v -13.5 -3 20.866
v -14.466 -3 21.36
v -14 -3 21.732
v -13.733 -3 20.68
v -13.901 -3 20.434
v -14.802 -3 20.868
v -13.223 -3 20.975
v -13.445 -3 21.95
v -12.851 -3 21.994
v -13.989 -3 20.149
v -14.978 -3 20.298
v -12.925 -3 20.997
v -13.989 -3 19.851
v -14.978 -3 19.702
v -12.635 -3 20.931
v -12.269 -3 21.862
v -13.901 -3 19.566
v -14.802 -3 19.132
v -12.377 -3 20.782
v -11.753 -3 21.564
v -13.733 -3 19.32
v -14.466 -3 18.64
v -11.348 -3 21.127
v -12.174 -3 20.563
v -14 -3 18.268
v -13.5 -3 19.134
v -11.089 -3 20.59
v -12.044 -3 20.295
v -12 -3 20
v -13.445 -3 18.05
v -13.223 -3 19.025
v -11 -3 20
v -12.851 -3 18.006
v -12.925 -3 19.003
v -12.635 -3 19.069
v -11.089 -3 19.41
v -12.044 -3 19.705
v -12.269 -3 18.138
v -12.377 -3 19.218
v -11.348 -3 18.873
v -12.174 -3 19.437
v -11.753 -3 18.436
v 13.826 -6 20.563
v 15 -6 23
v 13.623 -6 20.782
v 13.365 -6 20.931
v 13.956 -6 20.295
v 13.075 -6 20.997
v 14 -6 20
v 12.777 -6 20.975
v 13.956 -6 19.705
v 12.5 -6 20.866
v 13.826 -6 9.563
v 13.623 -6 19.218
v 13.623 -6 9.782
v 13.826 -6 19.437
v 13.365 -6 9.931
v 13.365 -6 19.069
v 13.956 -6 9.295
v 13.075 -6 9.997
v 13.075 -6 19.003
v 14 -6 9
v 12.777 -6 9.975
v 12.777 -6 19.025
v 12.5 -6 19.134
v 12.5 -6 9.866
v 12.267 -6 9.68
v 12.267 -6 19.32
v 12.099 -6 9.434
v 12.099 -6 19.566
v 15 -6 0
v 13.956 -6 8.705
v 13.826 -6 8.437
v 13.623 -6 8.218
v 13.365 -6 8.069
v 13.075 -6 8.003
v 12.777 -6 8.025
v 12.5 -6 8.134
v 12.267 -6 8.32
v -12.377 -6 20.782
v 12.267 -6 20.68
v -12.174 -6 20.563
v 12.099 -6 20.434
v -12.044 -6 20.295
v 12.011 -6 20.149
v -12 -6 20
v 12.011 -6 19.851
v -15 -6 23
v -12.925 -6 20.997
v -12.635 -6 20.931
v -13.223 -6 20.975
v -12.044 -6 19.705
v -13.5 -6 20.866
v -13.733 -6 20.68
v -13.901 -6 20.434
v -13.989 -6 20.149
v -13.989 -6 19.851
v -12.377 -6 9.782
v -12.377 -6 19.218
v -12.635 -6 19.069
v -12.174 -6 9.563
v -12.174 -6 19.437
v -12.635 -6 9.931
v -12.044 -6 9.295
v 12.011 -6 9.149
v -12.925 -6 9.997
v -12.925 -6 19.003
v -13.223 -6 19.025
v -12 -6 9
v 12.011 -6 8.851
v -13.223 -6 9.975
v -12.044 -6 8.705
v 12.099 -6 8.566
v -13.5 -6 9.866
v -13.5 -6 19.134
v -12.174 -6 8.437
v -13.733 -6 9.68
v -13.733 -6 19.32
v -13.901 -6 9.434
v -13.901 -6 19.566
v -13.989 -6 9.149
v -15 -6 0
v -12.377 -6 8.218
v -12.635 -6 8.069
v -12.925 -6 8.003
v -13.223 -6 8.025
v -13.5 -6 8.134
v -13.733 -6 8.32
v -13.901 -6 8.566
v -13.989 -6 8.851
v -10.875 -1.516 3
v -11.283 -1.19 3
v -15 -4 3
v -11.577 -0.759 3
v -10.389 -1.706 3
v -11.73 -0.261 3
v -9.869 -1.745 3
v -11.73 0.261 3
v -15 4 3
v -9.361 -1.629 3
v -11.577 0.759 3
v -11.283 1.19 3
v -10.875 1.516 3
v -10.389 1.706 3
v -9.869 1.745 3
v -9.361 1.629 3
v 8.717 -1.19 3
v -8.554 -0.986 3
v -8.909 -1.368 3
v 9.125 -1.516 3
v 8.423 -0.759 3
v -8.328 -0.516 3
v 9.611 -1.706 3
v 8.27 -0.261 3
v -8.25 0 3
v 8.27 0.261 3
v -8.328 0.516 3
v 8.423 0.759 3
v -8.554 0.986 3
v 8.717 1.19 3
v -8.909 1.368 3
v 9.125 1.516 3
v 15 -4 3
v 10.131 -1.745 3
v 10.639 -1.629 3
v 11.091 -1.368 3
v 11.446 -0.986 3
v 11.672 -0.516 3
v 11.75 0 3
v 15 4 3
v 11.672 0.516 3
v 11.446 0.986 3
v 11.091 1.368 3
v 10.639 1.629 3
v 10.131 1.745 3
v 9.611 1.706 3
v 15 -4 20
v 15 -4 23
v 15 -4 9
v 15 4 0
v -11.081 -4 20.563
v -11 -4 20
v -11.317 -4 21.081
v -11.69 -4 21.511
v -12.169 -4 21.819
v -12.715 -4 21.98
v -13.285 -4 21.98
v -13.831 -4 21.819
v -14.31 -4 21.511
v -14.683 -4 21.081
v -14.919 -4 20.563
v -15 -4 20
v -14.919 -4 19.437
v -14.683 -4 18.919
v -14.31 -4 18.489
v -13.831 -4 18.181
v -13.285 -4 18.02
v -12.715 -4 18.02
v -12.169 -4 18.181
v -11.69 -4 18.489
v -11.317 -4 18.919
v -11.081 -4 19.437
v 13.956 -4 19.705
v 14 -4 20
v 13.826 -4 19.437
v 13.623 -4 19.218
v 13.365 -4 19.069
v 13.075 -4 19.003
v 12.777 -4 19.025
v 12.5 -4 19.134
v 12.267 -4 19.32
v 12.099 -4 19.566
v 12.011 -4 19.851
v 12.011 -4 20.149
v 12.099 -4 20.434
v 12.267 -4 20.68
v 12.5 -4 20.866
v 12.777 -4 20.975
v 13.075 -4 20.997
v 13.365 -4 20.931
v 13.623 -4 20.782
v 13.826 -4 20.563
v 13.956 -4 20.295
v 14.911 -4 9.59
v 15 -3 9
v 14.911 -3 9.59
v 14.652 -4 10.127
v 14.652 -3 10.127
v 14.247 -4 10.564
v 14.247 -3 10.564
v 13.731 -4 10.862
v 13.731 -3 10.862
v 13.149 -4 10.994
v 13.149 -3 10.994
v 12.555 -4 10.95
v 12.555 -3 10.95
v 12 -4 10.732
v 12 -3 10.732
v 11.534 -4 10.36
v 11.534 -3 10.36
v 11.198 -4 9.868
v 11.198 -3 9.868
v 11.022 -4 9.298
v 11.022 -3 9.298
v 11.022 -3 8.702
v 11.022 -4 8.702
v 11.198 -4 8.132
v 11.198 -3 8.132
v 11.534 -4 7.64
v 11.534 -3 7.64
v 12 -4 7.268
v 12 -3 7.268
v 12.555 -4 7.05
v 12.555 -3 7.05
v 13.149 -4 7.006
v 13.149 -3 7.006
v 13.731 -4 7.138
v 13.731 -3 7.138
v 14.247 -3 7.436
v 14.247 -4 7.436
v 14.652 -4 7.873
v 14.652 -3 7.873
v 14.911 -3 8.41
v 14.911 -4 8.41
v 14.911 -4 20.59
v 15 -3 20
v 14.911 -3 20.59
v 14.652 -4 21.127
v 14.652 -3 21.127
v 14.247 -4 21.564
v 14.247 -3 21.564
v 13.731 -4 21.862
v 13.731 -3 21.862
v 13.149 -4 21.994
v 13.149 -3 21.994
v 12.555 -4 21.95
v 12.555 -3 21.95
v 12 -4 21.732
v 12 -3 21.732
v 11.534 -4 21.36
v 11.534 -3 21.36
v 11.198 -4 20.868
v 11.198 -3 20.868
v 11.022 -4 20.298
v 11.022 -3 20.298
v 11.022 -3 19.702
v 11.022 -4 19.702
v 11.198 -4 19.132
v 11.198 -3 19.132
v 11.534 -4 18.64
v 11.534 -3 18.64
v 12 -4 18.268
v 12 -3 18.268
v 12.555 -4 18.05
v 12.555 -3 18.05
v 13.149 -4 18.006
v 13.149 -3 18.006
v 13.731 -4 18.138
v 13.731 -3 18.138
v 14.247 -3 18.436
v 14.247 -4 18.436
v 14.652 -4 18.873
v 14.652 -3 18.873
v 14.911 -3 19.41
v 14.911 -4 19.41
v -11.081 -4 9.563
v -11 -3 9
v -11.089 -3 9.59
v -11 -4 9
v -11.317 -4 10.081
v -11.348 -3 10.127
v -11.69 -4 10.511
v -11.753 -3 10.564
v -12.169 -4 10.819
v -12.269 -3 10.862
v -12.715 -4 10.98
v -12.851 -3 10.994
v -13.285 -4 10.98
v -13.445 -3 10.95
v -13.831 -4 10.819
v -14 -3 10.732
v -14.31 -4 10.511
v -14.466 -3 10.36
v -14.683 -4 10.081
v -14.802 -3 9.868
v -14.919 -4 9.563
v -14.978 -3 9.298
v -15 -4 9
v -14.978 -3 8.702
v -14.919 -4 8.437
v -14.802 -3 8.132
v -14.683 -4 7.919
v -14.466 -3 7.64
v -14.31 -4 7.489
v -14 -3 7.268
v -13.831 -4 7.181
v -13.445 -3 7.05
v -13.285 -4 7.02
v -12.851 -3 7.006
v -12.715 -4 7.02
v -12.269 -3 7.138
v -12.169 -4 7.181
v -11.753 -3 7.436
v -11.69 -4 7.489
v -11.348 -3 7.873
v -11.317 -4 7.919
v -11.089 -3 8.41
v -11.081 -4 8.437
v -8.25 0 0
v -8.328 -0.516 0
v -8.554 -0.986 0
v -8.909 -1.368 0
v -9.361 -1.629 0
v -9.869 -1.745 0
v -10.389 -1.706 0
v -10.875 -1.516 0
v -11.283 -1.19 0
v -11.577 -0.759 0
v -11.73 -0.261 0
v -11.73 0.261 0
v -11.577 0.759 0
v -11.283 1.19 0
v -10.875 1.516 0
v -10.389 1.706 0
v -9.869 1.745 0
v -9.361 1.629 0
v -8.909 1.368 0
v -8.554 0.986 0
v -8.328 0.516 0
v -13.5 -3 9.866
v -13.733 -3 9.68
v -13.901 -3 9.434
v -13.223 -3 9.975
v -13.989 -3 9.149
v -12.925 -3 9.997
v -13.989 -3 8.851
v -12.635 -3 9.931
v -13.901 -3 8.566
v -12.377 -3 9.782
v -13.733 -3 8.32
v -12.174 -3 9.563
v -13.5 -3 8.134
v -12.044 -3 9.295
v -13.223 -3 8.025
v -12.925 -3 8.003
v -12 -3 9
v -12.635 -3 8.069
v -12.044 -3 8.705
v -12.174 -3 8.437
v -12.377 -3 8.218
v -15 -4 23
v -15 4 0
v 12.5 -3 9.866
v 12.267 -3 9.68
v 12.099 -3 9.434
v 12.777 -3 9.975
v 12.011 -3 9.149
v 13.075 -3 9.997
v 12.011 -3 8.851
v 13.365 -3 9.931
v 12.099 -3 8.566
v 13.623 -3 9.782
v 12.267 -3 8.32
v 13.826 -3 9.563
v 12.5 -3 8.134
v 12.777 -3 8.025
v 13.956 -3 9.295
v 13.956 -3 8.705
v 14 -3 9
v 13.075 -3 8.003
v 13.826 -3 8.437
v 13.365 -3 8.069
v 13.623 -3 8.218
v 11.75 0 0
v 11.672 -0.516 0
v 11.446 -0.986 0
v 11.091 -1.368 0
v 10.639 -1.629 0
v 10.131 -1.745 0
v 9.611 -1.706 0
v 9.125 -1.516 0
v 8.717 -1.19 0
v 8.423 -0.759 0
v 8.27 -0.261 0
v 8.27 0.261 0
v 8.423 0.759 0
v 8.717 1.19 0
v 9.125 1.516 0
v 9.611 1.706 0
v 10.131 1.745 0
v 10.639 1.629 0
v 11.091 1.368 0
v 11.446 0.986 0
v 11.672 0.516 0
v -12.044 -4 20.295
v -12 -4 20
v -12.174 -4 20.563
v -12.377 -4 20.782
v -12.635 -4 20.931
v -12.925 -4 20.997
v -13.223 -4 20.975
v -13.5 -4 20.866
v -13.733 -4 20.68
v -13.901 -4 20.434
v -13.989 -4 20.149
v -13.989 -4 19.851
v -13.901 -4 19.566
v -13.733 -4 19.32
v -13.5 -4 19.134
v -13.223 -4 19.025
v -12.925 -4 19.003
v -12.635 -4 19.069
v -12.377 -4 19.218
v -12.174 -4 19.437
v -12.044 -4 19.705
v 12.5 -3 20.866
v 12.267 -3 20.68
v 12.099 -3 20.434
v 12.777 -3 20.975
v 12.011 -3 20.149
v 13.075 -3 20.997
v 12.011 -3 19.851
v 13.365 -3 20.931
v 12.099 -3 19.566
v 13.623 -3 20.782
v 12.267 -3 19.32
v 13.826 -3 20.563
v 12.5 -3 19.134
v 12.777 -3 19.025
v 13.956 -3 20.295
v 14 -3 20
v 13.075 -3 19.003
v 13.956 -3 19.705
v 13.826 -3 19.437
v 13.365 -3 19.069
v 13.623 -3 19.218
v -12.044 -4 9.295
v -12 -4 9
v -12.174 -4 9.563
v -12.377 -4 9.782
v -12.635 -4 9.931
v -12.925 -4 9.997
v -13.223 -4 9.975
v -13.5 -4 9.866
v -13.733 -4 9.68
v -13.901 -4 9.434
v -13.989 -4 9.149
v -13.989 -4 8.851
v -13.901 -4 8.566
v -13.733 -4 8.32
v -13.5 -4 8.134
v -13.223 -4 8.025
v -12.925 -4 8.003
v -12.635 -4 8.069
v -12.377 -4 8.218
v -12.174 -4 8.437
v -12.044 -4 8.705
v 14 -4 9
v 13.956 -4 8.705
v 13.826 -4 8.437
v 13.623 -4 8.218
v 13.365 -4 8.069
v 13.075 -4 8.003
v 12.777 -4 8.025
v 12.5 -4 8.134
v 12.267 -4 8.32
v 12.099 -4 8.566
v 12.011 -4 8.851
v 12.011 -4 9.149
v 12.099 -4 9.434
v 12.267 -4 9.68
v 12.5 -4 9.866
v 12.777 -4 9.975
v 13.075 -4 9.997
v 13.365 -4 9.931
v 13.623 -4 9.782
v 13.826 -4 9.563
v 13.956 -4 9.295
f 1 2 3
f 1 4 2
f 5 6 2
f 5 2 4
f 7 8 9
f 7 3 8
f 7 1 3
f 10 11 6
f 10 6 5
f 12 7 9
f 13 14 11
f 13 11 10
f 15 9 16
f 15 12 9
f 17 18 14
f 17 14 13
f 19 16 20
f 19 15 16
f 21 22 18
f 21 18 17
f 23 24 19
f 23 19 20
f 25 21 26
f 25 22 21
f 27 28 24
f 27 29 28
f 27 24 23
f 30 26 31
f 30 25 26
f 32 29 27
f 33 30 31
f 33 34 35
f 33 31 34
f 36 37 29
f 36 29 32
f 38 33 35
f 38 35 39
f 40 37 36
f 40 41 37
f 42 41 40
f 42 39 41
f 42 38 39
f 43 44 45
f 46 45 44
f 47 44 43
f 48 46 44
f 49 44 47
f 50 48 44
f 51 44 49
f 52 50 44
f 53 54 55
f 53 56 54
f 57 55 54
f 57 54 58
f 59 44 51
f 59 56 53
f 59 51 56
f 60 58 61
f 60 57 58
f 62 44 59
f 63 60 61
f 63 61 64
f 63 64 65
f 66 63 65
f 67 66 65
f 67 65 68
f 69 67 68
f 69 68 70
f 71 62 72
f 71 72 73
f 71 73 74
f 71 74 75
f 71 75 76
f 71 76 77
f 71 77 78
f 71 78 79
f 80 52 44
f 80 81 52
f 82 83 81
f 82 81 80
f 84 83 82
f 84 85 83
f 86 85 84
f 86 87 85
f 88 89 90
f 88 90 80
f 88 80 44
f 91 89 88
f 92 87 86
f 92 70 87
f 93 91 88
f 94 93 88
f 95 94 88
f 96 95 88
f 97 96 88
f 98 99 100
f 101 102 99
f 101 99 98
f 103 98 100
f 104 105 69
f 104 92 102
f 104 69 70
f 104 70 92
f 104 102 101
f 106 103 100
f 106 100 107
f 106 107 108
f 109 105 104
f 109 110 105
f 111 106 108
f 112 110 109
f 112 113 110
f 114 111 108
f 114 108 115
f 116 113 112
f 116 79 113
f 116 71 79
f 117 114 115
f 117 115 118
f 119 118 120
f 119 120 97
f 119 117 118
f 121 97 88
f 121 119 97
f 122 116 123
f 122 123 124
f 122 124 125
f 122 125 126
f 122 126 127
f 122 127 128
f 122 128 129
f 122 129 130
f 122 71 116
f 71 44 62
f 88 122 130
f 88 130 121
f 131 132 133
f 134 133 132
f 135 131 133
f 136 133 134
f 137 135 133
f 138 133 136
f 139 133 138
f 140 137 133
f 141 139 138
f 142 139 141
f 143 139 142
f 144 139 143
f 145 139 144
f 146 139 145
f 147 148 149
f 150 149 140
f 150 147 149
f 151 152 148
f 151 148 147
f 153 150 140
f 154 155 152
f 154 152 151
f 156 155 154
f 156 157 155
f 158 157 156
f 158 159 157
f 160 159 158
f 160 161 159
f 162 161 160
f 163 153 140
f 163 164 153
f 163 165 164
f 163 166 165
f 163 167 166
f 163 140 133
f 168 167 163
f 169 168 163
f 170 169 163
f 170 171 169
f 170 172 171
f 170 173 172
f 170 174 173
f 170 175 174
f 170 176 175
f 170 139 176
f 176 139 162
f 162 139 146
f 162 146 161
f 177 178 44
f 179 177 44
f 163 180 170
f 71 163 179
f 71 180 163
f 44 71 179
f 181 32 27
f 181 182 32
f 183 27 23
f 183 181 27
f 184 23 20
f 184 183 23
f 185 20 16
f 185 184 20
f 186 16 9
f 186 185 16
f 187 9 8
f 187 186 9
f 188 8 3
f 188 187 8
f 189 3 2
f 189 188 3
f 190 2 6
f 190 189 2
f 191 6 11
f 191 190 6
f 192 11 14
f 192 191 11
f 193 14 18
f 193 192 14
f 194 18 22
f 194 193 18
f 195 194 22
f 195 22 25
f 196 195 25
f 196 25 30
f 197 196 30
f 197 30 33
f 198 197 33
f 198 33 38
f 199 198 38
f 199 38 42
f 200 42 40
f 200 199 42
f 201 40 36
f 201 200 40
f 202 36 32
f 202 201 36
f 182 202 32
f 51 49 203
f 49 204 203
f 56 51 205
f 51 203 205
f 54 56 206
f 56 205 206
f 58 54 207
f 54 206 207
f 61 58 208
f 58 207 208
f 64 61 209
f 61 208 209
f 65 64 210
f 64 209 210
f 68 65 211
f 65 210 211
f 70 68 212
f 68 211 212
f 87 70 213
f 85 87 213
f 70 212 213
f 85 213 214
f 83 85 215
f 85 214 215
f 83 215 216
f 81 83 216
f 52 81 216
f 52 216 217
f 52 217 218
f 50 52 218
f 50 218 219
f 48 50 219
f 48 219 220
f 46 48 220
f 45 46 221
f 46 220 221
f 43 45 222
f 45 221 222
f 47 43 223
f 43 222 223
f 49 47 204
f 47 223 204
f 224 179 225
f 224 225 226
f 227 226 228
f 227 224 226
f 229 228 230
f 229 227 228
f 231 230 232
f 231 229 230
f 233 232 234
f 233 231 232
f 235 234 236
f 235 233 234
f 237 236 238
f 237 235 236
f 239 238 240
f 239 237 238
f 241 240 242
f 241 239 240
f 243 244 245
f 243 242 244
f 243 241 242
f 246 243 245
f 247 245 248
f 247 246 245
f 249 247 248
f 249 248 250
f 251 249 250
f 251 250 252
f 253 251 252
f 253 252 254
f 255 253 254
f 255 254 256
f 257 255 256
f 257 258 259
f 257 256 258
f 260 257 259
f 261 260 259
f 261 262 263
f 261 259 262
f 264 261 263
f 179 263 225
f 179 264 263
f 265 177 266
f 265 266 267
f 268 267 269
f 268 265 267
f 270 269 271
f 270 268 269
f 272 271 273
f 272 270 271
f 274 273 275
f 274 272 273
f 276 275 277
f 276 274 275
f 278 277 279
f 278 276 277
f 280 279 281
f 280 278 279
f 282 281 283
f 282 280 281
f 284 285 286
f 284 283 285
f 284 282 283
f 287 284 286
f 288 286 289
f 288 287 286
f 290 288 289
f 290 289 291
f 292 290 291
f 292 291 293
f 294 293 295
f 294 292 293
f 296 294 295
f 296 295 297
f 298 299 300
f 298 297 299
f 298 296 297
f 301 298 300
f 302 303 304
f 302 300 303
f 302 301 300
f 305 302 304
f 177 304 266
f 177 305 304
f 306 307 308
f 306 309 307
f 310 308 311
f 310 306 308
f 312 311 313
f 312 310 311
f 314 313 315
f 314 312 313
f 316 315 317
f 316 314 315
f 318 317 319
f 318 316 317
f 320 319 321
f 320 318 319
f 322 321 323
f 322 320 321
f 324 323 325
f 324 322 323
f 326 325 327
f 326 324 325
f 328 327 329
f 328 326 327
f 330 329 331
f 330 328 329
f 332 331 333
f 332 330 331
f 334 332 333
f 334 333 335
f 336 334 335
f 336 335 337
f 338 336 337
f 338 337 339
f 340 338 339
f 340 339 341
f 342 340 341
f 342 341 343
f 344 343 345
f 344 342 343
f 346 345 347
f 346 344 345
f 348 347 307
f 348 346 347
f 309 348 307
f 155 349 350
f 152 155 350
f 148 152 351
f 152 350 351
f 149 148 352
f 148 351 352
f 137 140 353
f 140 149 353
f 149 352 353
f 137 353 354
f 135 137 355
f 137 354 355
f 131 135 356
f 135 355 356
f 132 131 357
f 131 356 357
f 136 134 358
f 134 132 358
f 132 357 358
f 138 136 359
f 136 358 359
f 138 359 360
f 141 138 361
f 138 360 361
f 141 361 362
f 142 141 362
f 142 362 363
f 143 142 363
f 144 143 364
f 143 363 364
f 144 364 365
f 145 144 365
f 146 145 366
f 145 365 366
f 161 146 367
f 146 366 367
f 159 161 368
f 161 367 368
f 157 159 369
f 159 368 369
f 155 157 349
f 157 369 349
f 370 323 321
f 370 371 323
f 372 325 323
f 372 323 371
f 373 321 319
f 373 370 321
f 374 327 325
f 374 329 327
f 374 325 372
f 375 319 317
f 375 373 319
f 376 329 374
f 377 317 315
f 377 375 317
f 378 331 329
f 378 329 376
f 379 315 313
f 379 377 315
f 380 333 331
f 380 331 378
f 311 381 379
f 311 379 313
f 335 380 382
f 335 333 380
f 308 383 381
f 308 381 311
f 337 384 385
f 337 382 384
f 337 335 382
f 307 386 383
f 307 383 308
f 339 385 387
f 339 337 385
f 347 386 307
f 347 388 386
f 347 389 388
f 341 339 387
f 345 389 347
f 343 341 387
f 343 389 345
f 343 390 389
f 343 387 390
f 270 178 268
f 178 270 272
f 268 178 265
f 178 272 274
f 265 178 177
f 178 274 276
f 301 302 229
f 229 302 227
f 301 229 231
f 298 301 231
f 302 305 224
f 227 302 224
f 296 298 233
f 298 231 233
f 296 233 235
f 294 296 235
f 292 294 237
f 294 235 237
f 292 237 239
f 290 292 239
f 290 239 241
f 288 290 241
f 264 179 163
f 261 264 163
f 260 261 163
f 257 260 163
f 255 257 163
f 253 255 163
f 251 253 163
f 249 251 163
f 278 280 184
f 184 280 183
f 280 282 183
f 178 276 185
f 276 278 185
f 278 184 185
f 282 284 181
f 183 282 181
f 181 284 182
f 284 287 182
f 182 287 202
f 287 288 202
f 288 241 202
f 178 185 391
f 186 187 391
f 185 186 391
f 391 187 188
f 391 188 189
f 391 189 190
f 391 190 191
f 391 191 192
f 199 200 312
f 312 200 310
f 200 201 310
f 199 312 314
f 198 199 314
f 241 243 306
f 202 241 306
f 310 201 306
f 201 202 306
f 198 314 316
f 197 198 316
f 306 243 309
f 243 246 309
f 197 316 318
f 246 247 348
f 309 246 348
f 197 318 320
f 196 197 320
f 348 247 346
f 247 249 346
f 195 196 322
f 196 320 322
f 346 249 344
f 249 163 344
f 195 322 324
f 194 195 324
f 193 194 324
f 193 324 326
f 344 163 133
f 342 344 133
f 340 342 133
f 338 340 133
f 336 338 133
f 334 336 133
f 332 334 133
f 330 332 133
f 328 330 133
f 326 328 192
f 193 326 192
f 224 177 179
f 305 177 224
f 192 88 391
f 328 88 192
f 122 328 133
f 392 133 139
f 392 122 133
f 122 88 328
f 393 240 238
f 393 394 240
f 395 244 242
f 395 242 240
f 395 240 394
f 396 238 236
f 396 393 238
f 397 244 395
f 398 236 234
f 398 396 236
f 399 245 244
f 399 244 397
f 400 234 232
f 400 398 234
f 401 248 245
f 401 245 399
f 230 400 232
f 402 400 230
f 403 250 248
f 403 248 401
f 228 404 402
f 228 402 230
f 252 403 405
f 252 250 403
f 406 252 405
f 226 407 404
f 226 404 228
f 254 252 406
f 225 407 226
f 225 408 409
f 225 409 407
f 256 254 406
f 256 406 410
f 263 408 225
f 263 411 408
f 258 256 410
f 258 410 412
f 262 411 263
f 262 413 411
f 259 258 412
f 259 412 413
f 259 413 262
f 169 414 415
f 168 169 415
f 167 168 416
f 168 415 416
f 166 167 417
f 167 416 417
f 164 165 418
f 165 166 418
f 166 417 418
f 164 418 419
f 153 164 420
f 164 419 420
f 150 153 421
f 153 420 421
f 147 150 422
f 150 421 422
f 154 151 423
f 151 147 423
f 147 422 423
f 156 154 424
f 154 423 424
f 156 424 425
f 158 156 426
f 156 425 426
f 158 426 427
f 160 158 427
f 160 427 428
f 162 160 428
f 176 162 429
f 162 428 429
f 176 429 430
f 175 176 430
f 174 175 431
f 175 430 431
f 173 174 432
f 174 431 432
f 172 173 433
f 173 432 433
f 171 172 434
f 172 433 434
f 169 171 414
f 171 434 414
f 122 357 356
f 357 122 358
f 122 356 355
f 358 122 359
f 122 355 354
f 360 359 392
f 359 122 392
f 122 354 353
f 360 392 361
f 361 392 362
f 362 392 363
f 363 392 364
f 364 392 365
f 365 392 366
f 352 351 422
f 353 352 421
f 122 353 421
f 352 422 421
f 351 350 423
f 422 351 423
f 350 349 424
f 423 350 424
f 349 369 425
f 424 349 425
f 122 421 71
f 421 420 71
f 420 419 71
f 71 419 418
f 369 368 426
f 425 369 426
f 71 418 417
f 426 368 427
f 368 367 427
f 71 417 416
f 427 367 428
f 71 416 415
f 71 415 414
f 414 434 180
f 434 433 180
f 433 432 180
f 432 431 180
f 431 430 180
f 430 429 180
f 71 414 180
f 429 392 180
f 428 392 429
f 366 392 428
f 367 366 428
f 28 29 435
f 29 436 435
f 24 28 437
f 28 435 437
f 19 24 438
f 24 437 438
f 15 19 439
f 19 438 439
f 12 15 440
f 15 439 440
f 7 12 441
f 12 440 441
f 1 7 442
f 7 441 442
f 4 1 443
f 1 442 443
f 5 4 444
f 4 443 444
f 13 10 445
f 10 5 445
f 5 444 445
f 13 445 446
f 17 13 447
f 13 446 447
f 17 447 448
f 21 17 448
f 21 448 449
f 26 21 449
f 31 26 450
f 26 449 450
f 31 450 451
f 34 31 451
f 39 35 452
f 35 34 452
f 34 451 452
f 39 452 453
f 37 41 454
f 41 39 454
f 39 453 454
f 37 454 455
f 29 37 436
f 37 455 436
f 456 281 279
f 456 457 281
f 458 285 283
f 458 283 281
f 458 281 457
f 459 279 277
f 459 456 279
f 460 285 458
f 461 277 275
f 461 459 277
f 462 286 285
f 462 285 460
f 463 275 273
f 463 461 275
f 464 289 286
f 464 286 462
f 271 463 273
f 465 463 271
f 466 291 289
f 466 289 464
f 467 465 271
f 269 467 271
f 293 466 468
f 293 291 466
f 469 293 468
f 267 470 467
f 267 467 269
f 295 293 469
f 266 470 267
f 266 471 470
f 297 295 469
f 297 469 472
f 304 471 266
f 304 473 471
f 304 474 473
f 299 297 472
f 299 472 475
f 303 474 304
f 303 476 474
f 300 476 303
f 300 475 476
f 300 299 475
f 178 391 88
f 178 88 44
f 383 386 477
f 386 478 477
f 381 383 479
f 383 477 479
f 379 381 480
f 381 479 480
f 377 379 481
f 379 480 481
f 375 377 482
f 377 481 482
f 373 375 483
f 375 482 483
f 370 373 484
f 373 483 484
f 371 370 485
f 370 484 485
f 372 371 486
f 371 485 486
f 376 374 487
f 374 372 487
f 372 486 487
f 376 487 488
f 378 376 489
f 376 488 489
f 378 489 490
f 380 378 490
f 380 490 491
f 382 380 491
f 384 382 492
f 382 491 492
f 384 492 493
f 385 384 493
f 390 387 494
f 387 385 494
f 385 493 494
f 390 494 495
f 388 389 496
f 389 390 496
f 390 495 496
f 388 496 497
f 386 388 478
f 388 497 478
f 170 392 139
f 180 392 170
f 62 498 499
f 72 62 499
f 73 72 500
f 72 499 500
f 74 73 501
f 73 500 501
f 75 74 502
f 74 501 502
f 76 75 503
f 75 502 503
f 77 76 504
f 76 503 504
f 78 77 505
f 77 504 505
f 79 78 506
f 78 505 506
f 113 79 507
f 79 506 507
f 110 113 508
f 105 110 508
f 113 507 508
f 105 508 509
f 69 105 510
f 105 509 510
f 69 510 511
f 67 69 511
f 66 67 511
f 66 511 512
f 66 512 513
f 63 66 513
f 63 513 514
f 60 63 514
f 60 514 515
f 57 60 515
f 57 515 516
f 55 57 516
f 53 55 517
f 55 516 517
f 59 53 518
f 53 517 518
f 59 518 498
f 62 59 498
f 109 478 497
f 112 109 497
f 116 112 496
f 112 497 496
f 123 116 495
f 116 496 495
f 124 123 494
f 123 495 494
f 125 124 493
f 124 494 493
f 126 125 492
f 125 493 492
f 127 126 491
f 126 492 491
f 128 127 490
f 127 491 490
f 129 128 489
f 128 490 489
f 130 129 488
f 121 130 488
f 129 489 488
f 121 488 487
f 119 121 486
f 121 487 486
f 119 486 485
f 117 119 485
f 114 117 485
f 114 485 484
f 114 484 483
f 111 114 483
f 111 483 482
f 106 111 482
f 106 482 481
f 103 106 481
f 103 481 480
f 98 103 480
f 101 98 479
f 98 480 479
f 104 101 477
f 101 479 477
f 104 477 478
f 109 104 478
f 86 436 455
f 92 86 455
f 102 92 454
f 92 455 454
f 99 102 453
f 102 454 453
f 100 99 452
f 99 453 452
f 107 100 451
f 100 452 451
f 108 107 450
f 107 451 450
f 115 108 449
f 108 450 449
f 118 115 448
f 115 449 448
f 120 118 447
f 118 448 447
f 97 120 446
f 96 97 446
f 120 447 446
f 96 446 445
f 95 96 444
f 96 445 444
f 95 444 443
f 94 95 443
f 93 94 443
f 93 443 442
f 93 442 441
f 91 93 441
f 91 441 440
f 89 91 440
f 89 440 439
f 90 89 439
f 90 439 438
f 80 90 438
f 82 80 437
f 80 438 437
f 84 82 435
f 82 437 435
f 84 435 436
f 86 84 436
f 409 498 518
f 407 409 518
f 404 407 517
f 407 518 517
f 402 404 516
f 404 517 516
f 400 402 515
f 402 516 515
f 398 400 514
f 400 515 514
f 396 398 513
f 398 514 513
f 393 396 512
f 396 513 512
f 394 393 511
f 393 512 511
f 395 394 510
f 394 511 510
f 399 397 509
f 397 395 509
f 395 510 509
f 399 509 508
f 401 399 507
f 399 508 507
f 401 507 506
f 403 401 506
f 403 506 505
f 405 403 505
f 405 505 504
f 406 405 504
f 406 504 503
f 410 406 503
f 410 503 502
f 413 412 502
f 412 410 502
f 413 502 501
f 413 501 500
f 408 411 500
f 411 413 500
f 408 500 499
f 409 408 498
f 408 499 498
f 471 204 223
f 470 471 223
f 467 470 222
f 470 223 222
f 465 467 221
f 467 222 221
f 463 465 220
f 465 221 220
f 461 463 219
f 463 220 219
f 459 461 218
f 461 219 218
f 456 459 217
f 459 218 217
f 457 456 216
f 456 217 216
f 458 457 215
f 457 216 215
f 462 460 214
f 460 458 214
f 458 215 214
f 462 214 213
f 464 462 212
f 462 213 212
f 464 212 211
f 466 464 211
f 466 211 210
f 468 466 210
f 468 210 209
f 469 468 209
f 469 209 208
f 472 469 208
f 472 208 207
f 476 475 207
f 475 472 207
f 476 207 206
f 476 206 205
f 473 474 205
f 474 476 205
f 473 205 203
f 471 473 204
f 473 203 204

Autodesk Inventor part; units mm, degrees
ref_plane "YZ Plane" through (0, 0, 0) normal (1, 0, 0) x (0, 1, 0)
ref_plane "XZ Plane" through (0, 0, 0) normal (0, 1, 0) x (-1, 0, 0)
ref_plane "XY Plane" through (0, 0, 0) normal (0, 0, 1) x (1, 0, 0)
sketch "Sketch1" plane through (0, 0, 0) normal (0, 0, 1) x (1, 0, 0)
  circle A0 centre (-10, 0) radius 1.75
  circle A1 centre (10, 0) radius 1.75
  line L0 (-15, 4) -> (15, 4)
  line L1 (15, 4) -> (15, -6)
  line L2 (15, -6) -> (-15, -6)
  line L3 (-15, -6) -> (-15, 4)
  point P0 (0, 0)
  dimension "d0" = 10
  dimension "d1" = 10
  dimension "d2" = 3.5
  dimension "d3" = 5
  dimension "d4" = 5
  dimension "d5" = 4
  dimension "d6" = 10
extrude "Extrusion1" add sketch "Sketch1" along normal blind 3
sketch "Sketch2" plane through (0, 0, 3) normal (0, 0, 1) x (1, 0, 0)
  line L0 (-15, -6) -> (15, -6) projected
  line L1 (15, -6) -> (15, 4) projected
  line L2 (15, 4) -> (-15, 4) projected
  line L3 (-15, 4) -> (-15, -6) projected
  circle A0 centre (10, 0) radius 1.75 projected
  circle A1 centre (-10, 0) radius 1.75 projected
  line L4 (15, -6) -> (15, 4) projected
  line L5 (-15, -6) -> (15, -6)
  line L6 (15, -6) -> (15, -4)
  line L7 (15, -4) -> (-15, -4)
  line L8 (-15, -4) -> (-15, -6)
  point P0 (0, 0)
  dimension "d9" = 2
extrude "Extrusion2" add sketch "Sketch2" along normal blind 20 contours L3 L7 L1 L0
sketch "Sketch4" plane through (-15, -4, 3) normal (0, 1, 0) x (1, 0, 0)
  line L0 (0, 0) -> (30, 0) projected
  line L1 (0, 0) -> (0, -20) projected
  line L2 (30, -20) -> (0, -20) projected
  line L3 (30, 0) -> (30, -20) projected
  circle A0 centre (2, -6) radius 1
  circle A1 centre (28, -6) radius 1
  circle A2 centre (28, -17) radius 1
  circle A3 centre (2, -17) radius 1
  circle A4 centre (2, -6) radius 2
  line L4 (0, 3) -> (0, -20) projected
  circle A5 centre (2, -17) radius 2
  circle A6 centre (28, -17) radius 2
  line L5 (30, 3) -> (30, -20) projected
  circle A7 centre (28, -6) radius 2
  point P0 (15, 3)
  dimension "d12" = 2
  dimension "d13" = 26
  dimension "d14" = 11
  dimension "d15" = 2
  dimension "d16" = 6
extrude "Extrusion3" add sketch "Sketch4" along normal blind 1 contours A4 | A5 | A6 | A7
sketch "Sketch5" plane through (-13, -4, 9) normal (0, 1, 0) x (1, 0, 0)
  circle A0 centre (0, 0) radius 1 projected
  circle A1 centre (26, 0) radius 1 projected
  circle A2 centre (26, -11) radius 1 projected
  circle A3 centre (0, -11) radius 1 projected
  point P0 (13, 9)
extrude "Extrusion4" cut sketch "Sketch5" against normal through all
equation "\"d1\" = d0"
equation "\"d4\" = d3"
properties part number "Nozzlecam_PCB_Mount" material "ABS Plastic"
